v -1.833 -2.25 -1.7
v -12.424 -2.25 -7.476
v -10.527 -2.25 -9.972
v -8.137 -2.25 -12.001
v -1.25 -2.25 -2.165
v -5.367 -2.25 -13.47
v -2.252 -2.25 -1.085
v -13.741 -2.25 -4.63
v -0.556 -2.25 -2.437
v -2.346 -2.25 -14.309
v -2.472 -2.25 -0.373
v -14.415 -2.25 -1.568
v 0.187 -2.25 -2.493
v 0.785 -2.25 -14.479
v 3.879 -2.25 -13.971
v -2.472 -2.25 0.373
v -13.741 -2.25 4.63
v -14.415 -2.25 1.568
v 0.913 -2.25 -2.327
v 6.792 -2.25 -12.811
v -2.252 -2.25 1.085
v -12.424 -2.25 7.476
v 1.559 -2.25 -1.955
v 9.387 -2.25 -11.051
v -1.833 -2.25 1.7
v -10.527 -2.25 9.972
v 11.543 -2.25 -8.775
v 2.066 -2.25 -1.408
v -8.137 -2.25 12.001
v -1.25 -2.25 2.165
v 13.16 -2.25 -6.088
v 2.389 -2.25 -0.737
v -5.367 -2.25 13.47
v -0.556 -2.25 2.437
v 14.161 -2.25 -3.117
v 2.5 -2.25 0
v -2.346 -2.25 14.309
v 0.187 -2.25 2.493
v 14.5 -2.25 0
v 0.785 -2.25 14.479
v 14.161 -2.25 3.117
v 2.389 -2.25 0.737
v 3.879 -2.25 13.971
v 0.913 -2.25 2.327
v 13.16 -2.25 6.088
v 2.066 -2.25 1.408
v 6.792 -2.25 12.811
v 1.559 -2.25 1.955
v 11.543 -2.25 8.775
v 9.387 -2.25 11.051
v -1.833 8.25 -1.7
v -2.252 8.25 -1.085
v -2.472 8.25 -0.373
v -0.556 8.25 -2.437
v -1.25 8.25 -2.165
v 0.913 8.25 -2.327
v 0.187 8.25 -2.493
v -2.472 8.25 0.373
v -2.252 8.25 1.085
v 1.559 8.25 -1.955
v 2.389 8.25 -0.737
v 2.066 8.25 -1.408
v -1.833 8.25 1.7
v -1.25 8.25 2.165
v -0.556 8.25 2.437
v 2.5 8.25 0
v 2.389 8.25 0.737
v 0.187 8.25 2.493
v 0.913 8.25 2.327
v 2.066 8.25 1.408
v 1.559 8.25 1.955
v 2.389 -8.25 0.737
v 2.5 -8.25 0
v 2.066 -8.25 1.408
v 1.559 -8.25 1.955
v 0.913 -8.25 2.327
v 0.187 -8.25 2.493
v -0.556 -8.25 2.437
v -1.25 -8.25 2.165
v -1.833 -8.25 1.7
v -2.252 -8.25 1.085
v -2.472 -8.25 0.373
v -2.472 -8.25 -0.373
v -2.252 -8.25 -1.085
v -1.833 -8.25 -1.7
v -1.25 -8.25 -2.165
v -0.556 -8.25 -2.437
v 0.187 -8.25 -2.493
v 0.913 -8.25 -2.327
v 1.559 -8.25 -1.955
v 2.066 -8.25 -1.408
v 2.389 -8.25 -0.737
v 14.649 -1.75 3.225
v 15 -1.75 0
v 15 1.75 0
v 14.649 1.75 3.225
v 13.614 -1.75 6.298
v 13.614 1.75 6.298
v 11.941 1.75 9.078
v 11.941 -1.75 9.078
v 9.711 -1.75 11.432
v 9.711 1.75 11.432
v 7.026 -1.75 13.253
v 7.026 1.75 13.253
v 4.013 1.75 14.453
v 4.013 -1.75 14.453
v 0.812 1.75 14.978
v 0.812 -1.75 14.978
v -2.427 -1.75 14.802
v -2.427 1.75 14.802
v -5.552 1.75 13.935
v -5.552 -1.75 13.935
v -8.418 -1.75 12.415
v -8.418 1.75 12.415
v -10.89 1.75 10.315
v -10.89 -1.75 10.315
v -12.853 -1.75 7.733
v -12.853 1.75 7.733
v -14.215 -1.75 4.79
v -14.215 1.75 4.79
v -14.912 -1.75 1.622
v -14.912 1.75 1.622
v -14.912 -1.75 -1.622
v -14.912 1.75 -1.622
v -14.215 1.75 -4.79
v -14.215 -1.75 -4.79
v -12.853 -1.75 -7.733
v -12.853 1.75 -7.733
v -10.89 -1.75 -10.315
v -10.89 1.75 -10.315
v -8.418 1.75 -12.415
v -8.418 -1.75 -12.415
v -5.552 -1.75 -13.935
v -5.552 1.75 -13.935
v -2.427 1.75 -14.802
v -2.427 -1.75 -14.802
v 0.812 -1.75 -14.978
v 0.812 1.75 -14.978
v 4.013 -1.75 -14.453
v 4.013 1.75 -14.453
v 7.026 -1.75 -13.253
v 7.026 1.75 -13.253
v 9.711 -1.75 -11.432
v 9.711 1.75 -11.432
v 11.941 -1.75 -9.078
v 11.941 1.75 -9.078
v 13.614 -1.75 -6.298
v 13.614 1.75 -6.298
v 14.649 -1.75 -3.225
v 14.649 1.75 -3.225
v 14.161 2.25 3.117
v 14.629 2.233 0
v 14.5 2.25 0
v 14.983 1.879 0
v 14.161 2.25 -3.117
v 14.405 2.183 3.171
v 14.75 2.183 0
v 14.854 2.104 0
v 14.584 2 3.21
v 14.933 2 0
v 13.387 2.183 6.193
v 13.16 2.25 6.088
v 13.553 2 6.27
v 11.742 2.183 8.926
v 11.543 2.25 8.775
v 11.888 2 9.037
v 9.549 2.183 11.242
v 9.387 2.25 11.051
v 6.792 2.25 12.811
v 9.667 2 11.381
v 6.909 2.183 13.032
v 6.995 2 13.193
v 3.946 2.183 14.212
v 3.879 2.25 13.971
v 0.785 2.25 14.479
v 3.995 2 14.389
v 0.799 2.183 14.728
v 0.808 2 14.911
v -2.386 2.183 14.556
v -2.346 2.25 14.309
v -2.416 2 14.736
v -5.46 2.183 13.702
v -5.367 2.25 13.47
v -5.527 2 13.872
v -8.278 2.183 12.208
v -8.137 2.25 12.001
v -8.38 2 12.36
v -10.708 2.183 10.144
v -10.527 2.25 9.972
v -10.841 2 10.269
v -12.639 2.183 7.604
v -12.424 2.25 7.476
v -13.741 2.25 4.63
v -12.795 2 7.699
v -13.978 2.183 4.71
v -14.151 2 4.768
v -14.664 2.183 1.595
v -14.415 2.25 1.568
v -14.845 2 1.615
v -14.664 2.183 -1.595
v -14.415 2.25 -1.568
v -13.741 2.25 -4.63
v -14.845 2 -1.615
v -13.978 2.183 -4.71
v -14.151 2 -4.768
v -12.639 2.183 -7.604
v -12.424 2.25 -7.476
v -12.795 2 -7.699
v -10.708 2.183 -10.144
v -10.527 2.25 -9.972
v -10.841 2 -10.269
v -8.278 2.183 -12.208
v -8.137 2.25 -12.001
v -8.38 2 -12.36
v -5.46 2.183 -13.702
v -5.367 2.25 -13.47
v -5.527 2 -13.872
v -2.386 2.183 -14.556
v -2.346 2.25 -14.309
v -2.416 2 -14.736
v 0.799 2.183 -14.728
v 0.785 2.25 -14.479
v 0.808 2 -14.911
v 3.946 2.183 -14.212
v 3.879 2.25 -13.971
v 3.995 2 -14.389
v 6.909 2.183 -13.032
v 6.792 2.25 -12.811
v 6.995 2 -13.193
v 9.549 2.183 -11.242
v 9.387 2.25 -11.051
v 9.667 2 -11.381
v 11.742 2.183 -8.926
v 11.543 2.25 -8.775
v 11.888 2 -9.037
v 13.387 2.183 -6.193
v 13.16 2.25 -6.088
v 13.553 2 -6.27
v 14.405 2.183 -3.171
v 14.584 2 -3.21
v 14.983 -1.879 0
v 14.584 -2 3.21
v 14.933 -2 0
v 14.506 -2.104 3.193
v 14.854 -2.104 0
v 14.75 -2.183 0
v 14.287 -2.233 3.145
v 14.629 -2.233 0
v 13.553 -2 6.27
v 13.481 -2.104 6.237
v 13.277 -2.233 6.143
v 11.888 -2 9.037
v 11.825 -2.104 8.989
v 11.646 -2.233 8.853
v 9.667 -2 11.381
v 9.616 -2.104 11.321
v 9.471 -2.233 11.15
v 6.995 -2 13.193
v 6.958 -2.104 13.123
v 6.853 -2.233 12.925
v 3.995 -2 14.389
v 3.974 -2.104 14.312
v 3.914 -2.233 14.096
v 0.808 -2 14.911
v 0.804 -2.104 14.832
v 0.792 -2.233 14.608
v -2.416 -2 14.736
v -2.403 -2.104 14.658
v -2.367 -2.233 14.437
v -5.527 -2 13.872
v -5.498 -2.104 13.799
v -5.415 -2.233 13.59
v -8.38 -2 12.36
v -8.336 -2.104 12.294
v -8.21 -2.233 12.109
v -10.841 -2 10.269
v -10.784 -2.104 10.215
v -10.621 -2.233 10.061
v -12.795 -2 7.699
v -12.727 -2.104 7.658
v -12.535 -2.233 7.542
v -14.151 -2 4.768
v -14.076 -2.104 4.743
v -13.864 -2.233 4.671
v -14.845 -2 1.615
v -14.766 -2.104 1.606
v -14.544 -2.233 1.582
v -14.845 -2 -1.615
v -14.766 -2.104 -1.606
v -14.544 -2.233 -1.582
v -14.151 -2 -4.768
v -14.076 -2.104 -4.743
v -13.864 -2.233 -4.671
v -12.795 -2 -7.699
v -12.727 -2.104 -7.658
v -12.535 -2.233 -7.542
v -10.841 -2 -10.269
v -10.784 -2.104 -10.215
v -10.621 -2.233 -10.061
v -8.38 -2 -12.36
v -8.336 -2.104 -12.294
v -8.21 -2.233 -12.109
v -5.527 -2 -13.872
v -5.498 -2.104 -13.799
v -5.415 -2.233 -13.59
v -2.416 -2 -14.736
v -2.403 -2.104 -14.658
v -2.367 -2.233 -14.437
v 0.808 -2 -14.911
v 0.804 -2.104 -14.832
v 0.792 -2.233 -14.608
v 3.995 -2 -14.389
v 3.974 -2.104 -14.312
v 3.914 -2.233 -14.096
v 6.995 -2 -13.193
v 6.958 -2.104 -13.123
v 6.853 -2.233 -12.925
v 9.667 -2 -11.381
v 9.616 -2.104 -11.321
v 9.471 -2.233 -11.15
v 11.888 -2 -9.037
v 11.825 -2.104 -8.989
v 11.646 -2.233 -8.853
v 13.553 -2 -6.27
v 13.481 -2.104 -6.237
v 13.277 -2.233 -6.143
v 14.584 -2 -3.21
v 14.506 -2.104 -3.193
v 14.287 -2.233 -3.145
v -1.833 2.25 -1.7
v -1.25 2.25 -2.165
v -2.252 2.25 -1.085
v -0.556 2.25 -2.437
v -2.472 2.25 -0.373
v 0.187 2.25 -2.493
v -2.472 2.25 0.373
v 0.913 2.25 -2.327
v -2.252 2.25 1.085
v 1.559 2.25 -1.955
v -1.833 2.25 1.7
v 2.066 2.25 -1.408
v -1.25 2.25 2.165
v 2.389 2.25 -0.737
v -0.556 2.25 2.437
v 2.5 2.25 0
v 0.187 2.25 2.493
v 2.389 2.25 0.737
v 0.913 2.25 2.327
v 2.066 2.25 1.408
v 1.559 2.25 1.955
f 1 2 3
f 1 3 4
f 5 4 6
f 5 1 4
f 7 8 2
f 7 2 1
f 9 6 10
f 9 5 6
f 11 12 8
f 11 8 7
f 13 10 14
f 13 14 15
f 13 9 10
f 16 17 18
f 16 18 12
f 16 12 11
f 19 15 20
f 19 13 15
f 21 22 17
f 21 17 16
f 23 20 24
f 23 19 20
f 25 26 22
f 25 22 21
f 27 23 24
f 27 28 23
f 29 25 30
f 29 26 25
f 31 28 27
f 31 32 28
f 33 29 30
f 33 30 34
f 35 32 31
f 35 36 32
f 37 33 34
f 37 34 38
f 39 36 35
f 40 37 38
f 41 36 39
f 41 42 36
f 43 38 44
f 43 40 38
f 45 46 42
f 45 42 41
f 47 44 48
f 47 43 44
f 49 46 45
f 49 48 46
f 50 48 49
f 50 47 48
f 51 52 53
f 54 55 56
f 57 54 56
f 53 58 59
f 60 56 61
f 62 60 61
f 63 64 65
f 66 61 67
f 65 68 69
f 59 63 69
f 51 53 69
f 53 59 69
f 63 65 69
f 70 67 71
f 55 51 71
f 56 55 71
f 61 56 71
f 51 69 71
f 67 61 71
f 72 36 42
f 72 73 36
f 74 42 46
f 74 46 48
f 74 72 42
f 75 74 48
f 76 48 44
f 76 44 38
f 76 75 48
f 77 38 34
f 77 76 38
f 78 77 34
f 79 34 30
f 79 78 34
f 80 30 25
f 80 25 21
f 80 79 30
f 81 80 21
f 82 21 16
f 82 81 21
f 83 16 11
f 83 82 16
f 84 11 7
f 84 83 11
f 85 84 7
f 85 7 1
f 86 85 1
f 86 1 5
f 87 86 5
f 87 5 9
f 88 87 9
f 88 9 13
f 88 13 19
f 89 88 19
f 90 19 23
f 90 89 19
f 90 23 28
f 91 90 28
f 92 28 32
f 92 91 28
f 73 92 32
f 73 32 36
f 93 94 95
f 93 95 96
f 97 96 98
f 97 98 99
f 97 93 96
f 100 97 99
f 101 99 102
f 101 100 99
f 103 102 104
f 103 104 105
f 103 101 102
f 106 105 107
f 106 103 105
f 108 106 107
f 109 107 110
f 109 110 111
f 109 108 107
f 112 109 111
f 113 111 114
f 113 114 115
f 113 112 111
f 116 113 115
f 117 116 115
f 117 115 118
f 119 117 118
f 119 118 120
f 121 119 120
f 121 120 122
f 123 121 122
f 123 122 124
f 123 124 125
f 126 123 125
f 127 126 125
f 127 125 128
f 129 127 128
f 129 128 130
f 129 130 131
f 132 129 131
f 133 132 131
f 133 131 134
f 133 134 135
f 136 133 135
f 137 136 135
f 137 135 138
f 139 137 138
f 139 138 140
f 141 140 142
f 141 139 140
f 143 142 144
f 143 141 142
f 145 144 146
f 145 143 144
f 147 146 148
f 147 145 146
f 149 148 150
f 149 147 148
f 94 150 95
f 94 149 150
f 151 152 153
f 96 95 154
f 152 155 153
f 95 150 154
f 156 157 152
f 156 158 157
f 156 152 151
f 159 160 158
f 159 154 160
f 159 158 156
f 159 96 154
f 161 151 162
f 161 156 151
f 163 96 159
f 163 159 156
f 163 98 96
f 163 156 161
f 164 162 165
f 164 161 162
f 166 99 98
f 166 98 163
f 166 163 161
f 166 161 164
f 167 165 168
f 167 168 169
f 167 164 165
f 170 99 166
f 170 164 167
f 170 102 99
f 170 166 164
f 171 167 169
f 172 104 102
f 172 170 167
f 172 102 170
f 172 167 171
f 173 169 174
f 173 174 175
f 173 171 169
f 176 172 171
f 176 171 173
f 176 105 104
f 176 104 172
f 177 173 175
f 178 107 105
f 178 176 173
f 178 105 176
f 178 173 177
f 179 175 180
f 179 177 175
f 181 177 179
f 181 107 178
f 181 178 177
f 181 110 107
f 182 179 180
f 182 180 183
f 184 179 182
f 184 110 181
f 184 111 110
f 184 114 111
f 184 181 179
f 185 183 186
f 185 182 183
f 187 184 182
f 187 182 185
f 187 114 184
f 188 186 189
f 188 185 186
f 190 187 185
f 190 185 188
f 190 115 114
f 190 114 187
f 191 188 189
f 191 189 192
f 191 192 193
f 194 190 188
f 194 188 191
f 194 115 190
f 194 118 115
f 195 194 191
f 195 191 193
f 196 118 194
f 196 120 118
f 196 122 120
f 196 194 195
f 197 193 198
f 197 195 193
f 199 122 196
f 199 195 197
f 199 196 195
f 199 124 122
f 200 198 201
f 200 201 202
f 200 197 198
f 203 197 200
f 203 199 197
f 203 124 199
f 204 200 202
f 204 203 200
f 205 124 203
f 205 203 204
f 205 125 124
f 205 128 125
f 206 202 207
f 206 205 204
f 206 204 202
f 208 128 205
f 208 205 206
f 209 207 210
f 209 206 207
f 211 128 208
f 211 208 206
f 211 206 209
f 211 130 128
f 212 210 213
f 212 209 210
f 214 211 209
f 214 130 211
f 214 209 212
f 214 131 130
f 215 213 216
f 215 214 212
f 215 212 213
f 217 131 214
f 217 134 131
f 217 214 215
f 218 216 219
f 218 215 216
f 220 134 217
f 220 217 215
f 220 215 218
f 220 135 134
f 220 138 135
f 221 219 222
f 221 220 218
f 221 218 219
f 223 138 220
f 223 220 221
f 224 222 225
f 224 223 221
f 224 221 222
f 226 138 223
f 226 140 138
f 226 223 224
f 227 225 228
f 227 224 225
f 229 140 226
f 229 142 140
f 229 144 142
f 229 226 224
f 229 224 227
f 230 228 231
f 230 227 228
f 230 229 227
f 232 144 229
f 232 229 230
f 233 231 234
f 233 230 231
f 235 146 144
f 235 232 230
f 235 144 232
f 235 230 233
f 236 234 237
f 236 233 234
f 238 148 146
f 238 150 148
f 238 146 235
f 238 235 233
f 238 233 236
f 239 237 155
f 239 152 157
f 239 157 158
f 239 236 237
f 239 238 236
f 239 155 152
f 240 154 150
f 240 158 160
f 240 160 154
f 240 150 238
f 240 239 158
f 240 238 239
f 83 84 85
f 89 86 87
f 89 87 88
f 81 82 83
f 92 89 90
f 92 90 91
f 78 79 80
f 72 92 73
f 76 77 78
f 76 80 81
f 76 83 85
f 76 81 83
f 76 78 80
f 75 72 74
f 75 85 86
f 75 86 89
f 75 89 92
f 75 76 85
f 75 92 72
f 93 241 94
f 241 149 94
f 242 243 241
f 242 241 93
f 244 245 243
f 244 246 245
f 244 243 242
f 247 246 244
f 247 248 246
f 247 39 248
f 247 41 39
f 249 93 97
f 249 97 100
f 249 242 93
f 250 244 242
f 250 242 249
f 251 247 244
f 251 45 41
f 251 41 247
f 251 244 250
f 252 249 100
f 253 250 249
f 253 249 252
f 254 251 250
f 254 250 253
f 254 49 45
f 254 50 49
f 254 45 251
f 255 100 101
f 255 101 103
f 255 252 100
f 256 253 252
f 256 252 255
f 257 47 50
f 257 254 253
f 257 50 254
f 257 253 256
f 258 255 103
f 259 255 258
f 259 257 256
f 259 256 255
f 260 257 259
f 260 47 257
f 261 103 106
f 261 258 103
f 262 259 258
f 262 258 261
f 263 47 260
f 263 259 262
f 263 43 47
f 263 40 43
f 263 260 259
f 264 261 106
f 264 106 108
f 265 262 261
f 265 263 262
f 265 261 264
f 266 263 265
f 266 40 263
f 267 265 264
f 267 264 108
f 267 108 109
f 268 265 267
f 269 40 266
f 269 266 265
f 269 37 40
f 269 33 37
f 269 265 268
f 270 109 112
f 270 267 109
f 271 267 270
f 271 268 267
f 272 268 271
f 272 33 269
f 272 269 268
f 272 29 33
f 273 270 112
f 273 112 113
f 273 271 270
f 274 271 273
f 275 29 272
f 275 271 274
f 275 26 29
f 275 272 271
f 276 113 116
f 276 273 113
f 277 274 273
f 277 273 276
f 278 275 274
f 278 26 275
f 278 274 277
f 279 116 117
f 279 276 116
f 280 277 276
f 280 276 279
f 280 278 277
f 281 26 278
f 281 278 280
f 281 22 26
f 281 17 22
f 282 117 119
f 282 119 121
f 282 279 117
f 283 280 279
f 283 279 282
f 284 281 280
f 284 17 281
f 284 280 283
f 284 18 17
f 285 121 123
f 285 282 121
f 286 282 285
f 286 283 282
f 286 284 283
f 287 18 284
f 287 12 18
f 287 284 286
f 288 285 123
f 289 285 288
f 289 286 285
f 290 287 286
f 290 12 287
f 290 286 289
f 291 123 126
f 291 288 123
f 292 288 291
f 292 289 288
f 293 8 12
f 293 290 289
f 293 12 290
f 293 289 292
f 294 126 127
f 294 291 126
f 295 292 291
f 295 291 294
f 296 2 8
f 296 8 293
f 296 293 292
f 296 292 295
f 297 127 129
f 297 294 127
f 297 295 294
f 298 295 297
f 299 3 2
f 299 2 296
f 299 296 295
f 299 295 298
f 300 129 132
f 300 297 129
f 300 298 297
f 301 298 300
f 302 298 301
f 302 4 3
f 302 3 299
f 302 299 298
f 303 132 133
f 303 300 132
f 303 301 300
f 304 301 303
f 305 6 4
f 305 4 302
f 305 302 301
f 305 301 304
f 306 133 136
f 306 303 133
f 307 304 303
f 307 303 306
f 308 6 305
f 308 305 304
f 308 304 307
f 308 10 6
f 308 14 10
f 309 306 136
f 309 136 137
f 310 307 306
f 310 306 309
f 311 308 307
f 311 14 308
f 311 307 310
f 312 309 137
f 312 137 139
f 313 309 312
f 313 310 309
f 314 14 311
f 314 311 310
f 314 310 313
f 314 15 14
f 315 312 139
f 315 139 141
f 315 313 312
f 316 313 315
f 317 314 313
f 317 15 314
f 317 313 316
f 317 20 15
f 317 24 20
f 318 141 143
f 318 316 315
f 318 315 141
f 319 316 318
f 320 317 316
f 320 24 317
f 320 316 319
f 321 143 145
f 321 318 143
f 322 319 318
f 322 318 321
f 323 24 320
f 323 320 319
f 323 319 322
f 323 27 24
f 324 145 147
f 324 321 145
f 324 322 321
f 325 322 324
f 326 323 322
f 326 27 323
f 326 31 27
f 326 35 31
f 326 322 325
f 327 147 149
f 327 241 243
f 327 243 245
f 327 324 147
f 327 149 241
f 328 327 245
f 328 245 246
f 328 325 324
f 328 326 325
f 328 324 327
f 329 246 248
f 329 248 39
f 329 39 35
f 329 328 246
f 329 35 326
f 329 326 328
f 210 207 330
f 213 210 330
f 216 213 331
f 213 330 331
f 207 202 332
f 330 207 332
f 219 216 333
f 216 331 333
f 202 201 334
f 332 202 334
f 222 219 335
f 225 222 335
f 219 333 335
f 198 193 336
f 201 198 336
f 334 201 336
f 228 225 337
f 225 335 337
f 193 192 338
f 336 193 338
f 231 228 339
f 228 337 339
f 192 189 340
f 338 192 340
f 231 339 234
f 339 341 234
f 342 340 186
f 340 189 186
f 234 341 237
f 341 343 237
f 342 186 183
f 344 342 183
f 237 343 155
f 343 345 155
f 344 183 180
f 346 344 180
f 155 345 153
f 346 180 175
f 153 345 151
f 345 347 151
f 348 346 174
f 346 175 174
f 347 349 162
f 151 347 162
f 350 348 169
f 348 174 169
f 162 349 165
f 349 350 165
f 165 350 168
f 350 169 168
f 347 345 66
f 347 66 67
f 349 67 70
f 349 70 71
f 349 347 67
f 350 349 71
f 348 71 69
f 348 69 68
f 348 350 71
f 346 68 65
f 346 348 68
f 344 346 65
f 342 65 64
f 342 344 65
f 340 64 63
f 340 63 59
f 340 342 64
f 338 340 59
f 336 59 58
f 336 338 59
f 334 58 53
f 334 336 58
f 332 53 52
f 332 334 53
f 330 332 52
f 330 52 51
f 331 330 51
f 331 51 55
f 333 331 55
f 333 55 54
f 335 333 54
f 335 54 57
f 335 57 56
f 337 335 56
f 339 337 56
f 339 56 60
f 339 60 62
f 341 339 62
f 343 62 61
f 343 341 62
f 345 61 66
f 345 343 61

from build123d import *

# Parameters (mm, degrees)
F0_R     = 15
F0_R_2   = 2.5
F1_DEPTH = 2.25
F2_DEPTH = 8.25
F3_R     = 0.5


with BuildPart() as f1:
    # F0 (on Front) → F1 (new body, symmetric)
    with BuildSketch(Plane.XZ):
        Circle(F0_R)
        Circle(F0_R_2, mode=Mode.SUBTRACT)
    extrude(amount=F1_DEPTH, both=True)

    # F0 (on Front) → F2 (join, symmetric)
    with BuildSketch(Plane.XZ):
        Circle(F0_R_2)
    extrude(amount=F2_DEPTH, both=True)

    # F3
    f3_edges = [f1.edges().sort_by_distance(p)[0] for p in [
        (-15, -2.25, 0),
        (-15, 2.25, 0),
    ]]
    fillet(f3_edges, radius=F3_R)


solid = f1.part
